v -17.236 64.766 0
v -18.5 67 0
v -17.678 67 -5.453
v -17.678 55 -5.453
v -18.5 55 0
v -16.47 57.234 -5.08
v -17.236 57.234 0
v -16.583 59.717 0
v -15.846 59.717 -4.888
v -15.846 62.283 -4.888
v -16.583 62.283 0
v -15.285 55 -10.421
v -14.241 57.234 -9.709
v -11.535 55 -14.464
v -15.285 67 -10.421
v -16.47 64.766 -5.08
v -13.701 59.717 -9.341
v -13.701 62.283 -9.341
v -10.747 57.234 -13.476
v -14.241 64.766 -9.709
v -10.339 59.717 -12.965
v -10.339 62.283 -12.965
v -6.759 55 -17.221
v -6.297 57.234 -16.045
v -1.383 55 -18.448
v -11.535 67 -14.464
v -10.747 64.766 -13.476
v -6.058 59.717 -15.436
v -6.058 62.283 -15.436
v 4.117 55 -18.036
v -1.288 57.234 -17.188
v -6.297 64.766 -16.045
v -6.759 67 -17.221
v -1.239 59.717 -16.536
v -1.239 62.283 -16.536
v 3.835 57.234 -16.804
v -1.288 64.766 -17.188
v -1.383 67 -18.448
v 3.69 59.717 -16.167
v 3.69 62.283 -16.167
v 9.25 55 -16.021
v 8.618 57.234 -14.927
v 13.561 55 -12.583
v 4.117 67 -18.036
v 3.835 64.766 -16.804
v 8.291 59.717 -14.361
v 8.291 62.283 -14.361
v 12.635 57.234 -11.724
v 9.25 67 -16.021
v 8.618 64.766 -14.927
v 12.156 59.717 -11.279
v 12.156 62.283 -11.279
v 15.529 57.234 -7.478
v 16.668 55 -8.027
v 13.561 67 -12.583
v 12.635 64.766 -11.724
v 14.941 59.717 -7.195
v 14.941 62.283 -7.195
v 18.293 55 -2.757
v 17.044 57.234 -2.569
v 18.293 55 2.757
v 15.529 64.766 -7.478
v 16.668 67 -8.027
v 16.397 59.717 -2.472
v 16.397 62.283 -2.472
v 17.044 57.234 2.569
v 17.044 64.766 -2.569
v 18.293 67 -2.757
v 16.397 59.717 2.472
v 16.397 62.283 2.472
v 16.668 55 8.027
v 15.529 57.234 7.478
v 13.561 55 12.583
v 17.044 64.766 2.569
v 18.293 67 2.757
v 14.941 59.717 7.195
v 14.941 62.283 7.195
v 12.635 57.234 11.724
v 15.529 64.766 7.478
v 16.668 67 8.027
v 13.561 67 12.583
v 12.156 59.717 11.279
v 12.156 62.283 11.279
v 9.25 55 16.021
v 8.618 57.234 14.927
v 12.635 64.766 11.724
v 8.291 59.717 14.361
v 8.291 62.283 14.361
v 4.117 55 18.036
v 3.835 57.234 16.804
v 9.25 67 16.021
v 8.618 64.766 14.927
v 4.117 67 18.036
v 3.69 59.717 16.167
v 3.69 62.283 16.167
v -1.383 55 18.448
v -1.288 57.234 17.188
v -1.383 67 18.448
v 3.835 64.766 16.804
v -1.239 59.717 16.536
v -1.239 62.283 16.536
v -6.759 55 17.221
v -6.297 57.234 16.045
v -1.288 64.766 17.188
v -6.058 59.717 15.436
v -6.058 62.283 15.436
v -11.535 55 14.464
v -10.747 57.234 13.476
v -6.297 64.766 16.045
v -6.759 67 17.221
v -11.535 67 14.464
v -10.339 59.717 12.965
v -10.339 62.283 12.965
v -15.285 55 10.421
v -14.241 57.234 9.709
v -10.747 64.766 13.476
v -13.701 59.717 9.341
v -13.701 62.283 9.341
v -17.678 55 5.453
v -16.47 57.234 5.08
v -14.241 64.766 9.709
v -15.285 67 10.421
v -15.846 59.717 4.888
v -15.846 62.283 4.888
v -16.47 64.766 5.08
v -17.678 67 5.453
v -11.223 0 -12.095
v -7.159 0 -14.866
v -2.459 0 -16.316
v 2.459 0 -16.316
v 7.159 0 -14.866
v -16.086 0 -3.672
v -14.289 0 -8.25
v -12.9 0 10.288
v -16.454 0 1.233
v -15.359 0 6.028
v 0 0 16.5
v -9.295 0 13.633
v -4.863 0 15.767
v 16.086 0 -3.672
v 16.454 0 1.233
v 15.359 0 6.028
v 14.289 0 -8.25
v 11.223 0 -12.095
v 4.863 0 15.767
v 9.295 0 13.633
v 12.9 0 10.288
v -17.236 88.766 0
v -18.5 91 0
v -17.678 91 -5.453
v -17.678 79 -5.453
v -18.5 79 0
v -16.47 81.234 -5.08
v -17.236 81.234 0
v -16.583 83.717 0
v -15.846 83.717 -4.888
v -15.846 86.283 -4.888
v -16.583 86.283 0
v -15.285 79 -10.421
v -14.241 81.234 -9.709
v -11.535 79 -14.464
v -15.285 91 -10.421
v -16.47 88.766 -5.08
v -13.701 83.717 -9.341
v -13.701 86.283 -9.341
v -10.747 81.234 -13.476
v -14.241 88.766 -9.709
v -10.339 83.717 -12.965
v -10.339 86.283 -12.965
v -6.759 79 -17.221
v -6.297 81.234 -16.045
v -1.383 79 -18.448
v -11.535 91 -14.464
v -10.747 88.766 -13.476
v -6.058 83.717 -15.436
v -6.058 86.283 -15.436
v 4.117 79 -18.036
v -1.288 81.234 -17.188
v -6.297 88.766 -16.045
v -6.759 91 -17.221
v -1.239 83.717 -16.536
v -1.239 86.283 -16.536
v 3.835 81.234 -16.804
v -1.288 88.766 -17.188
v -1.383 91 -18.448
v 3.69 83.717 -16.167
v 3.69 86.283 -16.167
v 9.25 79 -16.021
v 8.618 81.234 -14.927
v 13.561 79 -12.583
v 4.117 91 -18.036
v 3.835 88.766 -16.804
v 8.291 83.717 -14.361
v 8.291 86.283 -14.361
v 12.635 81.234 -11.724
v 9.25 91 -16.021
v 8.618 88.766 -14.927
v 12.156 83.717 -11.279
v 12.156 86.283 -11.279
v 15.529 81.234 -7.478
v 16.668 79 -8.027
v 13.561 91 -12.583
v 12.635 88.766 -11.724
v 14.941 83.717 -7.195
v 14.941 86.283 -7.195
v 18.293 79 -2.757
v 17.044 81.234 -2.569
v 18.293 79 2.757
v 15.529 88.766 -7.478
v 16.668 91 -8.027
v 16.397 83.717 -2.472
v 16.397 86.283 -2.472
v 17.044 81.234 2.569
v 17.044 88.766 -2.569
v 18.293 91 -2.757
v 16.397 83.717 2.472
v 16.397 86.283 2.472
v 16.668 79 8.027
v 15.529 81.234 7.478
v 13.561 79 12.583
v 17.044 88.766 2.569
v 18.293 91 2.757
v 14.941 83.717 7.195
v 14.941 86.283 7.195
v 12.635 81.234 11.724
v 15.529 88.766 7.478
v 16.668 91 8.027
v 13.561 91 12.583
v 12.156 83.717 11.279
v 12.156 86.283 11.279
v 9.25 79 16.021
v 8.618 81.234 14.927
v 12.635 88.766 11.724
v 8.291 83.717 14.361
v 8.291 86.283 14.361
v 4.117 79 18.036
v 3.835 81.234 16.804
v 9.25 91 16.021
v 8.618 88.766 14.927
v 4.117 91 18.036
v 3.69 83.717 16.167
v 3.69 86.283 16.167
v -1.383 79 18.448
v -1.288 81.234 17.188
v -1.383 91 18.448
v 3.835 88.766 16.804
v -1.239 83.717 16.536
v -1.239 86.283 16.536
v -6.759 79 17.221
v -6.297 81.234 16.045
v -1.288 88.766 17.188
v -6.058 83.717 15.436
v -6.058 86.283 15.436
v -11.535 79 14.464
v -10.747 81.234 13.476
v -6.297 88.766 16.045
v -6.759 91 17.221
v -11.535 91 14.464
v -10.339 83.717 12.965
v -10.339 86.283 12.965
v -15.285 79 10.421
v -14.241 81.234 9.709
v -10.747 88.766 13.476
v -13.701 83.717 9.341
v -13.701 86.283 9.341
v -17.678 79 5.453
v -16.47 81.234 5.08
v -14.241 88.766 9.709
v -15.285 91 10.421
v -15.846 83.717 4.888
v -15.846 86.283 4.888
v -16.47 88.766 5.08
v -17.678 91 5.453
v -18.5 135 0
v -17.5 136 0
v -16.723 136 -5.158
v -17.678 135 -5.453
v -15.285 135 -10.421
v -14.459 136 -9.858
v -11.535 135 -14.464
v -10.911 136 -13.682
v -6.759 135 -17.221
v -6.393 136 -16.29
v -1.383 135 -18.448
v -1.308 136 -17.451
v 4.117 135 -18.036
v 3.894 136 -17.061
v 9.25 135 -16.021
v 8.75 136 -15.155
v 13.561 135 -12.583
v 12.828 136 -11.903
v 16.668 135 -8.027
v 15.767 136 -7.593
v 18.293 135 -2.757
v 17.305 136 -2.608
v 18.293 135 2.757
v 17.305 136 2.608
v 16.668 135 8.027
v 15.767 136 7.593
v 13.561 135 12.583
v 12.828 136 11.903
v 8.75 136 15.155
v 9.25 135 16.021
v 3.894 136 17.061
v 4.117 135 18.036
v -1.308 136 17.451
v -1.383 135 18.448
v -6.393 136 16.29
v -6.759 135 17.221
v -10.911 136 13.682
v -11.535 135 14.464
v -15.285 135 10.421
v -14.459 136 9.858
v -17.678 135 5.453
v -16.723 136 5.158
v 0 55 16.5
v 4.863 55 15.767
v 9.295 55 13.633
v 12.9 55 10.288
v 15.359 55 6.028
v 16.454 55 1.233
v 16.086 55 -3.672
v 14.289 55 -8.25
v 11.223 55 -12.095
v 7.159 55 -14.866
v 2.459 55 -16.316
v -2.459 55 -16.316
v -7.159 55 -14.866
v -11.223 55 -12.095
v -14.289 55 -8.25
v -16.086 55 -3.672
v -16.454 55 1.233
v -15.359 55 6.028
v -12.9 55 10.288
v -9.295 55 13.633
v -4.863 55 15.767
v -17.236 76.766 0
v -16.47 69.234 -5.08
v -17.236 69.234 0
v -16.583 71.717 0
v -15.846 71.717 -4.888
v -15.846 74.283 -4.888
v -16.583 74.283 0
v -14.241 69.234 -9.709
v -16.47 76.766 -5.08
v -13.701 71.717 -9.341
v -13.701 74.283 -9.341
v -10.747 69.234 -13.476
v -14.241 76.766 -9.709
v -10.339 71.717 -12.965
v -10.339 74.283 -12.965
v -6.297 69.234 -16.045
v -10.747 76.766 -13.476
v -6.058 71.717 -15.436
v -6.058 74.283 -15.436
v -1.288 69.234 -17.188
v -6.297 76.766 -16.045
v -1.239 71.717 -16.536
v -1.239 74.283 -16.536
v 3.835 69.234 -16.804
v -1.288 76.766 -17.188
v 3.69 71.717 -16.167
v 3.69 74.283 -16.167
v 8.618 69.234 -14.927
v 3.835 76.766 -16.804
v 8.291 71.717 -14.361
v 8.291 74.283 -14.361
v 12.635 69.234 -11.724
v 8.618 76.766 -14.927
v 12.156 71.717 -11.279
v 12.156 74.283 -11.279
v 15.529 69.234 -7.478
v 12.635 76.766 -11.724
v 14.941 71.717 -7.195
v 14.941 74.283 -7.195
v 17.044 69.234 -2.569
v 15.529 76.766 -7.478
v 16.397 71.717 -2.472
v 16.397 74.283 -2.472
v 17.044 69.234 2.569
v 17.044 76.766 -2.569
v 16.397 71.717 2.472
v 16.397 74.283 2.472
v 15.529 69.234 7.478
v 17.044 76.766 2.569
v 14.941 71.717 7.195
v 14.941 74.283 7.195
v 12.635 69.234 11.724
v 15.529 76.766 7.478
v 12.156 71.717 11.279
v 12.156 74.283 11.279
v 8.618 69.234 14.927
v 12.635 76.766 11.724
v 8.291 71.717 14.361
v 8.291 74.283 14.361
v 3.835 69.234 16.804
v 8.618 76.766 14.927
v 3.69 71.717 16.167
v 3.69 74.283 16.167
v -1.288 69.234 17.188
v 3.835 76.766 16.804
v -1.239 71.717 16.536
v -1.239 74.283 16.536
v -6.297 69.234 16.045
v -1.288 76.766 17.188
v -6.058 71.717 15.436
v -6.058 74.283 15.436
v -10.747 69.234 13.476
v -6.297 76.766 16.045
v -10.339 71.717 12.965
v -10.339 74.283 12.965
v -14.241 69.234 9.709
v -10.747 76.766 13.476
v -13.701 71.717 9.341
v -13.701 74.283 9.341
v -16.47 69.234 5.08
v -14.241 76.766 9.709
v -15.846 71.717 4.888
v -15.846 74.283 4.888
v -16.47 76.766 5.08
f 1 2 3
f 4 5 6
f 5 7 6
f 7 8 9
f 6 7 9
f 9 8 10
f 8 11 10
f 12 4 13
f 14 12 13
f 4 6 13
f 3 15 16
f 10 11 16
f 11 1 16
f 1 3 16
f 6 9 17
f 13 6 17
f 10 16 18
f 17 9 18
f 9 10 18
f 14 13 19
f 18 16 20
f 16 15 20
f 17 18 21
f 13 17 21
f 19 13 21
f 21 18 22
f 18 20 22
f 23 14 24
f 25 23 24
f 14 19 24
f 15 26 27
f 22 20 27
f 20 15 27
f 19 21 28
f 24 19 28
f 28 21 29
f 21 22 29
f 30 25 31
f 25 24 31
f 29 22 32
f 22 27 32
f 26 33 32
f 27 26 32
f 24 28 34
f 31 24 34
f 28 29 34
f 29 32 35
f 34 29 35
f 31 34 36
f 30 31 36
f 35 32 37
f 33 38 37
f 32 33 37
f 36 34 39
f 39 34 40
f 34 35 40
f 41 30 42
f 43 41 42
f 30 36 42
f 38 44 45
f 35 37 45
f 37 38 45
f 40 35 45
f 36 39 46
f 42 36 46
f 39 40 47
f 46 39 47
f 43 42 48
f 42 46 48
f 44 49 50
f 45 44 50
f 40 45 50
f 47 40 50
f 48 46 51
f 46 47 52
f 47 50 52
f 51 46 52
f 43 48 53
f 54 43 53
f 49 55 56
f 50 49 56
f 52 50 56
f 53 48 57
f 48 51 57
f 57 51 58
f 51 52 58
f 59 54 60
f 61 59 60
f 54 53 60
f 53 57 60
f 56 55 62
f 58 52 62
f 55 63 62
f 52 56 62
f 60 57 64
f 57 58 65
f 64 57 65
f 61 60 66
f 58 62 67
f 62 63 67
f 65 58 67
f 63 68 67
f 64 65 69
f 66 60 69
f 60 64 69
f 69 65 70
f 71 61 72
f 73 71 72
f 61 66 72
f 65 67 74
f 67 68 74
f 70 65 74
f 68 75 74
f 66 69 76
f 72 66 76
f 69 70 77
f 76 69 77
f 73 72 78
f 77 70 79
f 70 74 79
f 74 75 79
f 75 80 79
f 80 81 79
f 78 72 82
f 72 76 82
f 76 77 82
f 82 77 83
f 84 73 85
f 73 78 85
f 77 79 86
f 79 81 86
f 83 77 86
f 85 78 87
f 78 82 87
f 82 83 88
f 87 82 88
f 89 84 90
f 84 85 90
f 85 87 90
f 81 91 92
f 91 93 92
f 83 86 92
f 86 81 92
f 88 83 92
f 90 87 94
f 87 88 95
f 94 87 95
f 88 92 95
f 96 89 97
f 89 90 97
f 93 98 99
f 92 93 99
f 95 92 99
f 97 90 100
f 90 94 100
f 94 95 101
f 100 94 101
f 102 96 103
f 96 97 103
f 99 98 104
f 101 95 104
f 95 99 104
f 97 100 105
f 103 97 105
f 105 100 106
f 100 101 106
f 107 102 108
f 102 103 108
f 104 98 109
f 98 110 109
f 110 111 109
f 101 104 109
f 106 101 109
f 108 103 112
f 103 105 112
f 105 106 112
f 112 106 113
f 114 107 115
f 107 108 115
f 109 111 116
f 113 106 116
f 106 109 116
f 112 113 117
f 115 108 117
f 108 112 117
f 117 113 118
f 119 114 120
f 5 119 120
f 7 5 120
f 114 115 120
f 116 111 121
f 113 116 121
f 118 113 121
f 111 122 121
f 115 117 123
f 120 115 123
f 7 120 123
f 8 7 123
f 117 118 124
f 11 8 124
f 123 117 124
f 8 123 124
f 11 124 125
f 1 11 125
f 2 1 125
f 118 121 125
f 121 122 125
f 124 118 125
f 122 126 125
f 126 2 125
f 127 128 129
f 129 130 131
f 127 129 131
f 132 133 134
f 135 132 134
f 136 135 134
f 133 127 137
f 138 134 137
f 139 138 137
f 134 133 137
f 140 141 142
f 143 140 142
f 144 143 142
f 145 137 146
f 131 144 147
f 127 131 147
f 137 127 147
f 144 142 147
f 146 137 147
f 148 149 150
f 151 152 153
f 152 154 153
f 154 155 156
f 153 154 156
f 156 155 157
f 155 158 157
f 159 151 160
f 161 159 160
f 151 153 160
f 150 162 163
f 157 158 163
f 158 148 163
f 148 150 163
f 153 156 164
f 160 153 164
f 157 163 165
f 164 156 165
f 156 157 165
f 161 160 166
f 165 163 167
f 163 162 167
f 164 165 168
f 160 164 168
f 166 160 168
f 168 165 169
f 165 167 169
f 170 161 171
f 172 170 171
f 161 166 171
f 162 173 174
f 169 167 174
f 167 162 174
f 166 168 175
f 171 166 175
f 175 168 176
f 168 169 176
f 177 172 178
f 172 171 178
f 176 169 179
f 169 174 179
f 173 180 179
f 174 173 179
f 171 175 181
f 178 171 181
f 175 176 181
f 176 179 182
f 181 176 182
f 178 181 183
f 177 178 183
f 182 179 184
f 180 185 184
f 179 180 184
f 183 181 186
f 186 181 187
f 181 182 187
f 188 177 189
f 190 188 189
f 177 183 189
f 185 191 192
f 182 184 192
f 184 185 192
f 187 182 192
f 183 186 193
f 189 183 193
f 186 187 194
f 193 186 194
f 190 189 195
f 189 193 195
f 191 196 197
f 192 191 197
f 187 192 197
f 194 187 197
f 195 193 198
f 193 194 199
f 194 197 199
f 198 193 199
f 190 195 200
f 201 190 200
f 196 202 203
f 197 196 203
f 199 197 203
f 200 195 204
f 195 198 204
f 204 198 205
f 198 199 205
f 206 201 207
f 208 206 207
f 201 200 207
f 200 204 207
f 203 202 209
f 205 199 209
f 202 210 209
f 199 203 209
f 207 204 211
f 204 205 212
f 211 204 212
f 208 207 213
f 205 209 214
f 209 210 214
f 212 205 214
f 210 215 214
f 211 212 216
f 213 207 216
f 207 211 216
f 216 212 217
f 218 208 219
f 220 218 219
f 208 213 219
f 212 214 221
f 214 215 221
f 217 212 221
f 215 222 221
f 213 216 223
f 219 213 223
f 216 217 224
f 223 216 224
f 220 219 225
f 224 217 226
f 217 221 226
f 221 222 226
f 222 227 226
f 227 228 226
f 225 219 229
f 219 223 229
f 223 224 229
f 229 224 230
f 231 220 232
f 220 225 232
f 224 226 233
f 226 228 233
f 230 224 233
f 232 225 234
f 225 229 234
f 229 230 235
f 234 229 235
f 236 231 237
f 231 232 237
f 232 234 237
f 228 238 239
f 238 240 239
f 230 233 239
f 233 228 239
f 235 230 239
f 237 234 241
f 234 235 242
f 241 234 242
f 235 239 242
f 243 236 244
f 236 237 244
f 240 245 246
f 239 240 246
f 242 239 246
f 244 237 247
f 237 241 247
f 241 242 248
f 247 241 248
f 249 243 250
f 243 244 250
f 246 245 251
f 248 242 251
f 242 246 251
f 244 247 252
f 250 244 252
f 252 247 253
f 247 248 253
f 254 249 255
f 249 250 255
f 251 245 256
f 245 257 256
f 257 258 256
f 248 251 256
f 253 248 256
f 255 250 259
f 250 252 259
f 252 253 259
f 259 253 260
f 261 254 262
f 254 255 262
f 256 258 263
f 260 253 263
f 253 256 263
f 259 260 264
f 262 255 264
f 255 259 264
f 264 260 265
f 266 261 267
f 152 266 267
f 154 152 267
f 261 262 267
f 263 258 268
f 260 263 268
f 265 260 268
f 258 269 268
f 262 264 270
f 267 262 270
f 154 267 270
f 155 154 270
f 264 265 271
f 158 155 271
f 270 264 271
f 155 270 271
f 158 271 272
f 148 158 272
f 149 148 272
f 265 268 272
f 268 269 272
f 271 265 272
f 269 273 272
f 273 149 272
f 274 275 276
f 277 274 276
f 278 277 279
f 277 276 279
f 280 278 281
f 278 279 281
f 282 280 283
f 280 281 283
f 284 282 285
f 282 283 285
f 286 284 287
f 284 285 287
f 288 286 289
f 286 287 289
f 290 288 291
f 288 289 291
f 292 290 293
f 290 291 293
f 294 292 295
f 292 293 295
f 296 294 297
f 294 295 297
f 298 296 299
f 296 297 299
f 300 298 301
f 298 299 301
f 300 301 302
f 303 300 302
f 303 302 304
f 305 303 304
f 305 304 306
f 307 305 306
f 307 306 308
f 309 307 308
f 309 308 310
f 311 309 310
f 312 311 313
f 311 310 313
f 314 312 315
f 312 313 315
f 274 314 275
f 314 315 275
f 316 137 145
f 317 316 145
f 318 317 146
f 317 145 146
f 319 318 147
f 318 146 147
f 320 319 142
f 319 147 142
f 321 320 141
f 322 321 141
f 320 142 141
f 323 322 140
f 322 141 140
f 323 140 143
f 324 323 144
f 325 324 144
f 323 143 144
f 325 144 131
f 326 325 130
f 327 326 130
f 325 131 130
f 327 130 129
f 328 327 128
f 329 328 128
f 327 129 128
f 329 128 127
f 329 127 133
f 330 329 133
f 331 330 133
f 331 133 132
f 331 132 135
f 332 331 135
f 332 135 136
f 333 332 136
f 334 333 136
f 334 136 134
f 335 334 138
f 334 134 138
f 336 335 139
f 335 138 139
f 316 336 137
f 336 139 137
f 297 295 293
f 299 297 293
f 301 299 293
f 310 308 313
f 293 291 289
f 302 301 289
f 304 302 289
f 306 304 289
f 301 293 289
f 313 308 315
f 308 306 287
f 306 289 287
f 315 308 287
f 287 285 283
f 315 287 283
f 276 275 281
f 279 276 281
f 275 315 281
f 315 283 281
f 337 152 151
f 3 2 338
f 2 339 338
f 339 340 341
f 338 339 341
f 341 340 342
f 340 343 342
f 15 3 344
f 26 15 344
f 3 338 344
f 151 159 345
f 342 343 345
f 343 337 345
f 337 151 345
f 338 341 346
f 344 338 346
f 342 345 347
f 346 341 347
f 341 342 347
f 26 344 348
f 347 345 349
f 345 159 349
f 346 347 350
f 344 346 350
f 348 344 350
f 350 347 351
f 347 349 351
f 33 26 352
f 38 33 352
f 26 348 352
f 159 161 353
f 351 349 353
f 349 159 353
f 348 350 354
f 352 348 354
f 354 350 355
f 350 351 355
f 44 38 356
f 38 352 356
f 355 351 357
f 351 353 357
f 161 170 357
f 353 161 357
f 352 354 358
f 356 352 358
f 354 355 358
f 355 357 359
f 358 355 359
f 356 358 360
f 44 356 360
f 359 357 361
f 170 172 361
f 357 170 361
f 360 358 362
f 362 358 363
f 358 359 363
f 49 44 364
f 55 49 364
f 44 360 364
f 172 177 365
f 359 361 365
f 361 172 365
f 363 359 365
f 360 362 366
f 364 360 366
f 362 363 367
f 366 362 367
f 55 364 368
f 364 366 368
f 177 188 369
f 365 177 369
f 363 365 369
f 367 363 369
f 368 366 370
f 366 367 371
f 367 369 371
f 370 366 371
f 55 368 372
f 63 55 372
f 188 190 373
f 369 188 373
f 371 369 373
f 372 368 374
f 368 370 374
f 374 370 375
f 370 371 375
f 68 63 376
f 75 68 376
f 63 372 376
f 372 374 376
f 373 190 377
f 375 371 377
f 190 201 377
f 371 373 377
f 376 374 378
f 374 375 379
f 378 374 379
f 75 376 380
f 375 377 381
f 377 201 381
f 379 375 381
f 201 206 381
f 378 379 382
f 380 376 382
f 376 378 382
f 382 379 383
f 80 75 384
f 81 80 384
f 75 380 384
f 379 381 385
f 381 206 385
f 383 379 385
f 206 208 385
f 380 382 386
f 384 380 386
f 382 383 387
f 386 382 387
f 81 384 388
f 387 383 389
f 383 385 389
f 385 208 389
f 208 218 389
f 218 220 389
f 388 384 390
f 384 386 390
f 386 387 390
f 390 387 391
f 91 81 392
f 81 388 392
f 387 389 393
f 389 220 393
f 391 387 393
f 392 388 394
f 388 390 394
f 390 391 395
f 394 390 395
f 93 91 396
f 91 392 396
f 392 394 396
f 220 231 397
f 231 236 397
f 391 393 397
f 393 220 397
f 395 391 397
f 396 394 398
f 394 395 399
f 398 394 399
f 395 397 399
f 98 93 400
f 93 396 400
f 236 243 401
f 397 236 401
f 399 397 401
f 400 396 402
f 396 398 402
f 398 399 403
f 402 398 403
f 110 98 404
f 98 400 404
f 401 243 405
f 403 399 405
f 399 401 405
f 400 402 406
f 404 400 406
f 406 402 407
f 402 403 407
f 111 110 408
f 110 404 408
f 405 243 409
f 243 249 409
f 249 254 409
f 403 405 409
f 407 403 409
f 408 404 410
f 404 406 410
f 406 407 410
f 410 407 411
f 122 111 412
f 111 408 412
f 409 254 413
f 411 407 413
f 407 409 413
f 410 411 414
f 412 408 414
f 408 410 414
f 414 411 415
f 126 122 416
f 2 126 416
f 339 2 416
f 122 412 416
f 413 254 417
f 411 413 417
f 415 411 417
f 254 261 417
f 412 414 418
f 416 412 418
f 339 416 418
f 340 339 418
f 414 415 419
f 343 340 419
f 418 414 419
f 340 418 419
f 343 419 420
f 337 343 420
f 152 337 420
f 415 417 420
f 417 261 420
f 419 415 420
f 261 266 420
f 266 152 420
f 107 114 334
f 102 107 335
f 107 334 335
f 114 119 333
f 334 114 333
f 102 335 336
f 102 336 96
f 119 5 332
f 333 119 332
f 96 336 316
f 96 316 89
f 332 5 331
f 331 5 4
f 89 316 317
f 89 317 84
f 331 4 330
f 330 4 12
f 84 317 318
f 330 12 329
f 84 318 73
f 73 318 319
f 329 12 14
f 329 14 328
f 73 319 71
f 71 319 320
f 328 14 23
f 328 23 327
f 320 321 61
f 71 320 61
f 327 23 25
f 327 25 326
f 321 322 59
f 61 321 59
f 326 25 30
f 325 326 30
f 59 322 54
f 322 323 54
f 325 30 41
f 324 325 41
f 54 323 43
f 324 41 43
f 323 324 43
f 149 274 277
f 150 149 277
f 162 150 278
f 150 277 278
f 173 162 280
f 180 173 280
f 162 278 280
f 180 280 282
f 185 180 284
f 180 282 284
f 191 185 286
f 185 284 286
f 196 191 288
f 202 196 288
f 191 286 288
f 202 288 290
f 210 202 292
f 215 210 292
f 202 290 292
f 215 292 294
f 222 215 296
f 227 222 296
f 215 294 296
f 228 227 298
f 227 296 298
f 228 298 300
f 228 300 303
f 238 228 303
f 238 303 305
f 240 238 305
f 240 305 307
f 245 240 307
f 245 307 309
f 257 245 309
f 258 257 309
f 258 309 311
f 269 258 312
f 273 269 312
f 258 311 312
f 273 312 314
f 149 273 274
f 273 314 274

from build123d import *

# Parameters (mm, degrees)
ESQUISSE1_R        = 16.5
BOSS_EXTRU_1_DEPTH = 55
CHANFREIN1_SIZE    = 1


with BuildPart() as part:
    # Esquisse1 → Boss.-Extru.1 (new body)
    with BuildSketch(Plane(origin=(0, 0, 0), x_dir=(1, 0, 0), z_dir=(0, 1, 0))):
        with Locations(Location((0, 0, 0), (0, 0, 270))):  # turned: the seam where the file's is
            Circle(ESQUISSE1_R)
    extrude(amount=BOSS_EXTRU_1_DEPTH)

    # Esquisse5 → Révolution1 (revolve)
    with BuildSketch(Plane.XY, mode=Mode.PRIVATE) as r_volution1_sk:
        with BuildLine():
            Line((0, 55), (18.5, 55))
            ThreePointArc((18.5, 55), (16.5, 61), (18.5, 67))
            ThreePointArc((18.5, 67), (16.5, 73), (18.5, 79))
            ThreePointArc((18.5, 79), (16.5, 85), (18.5, 91))
            Line((18.5, 91), (18.5, 136))
            Line((18.5, 136), (0, 136))
            Line((0, 136), (0, 55))
        make_face()
    revolve(r_volution1_sk.sketch.rotate(Axis((0, 136, 0), (0, -1, 0)), 180), axis=Axis((0, 136, 0), (0, -1, 0)))  # turned: the seam where the file's is

    # Chanfrein1
    chanfrein1_edges = [part.edges().sort_by_distance(p)[0] for p in [
        (18.5, 136, 0),
    ]]
    chamfer(chanfrein1_edges, length=CHANFREIN1_SIZE)


solid = part.part
